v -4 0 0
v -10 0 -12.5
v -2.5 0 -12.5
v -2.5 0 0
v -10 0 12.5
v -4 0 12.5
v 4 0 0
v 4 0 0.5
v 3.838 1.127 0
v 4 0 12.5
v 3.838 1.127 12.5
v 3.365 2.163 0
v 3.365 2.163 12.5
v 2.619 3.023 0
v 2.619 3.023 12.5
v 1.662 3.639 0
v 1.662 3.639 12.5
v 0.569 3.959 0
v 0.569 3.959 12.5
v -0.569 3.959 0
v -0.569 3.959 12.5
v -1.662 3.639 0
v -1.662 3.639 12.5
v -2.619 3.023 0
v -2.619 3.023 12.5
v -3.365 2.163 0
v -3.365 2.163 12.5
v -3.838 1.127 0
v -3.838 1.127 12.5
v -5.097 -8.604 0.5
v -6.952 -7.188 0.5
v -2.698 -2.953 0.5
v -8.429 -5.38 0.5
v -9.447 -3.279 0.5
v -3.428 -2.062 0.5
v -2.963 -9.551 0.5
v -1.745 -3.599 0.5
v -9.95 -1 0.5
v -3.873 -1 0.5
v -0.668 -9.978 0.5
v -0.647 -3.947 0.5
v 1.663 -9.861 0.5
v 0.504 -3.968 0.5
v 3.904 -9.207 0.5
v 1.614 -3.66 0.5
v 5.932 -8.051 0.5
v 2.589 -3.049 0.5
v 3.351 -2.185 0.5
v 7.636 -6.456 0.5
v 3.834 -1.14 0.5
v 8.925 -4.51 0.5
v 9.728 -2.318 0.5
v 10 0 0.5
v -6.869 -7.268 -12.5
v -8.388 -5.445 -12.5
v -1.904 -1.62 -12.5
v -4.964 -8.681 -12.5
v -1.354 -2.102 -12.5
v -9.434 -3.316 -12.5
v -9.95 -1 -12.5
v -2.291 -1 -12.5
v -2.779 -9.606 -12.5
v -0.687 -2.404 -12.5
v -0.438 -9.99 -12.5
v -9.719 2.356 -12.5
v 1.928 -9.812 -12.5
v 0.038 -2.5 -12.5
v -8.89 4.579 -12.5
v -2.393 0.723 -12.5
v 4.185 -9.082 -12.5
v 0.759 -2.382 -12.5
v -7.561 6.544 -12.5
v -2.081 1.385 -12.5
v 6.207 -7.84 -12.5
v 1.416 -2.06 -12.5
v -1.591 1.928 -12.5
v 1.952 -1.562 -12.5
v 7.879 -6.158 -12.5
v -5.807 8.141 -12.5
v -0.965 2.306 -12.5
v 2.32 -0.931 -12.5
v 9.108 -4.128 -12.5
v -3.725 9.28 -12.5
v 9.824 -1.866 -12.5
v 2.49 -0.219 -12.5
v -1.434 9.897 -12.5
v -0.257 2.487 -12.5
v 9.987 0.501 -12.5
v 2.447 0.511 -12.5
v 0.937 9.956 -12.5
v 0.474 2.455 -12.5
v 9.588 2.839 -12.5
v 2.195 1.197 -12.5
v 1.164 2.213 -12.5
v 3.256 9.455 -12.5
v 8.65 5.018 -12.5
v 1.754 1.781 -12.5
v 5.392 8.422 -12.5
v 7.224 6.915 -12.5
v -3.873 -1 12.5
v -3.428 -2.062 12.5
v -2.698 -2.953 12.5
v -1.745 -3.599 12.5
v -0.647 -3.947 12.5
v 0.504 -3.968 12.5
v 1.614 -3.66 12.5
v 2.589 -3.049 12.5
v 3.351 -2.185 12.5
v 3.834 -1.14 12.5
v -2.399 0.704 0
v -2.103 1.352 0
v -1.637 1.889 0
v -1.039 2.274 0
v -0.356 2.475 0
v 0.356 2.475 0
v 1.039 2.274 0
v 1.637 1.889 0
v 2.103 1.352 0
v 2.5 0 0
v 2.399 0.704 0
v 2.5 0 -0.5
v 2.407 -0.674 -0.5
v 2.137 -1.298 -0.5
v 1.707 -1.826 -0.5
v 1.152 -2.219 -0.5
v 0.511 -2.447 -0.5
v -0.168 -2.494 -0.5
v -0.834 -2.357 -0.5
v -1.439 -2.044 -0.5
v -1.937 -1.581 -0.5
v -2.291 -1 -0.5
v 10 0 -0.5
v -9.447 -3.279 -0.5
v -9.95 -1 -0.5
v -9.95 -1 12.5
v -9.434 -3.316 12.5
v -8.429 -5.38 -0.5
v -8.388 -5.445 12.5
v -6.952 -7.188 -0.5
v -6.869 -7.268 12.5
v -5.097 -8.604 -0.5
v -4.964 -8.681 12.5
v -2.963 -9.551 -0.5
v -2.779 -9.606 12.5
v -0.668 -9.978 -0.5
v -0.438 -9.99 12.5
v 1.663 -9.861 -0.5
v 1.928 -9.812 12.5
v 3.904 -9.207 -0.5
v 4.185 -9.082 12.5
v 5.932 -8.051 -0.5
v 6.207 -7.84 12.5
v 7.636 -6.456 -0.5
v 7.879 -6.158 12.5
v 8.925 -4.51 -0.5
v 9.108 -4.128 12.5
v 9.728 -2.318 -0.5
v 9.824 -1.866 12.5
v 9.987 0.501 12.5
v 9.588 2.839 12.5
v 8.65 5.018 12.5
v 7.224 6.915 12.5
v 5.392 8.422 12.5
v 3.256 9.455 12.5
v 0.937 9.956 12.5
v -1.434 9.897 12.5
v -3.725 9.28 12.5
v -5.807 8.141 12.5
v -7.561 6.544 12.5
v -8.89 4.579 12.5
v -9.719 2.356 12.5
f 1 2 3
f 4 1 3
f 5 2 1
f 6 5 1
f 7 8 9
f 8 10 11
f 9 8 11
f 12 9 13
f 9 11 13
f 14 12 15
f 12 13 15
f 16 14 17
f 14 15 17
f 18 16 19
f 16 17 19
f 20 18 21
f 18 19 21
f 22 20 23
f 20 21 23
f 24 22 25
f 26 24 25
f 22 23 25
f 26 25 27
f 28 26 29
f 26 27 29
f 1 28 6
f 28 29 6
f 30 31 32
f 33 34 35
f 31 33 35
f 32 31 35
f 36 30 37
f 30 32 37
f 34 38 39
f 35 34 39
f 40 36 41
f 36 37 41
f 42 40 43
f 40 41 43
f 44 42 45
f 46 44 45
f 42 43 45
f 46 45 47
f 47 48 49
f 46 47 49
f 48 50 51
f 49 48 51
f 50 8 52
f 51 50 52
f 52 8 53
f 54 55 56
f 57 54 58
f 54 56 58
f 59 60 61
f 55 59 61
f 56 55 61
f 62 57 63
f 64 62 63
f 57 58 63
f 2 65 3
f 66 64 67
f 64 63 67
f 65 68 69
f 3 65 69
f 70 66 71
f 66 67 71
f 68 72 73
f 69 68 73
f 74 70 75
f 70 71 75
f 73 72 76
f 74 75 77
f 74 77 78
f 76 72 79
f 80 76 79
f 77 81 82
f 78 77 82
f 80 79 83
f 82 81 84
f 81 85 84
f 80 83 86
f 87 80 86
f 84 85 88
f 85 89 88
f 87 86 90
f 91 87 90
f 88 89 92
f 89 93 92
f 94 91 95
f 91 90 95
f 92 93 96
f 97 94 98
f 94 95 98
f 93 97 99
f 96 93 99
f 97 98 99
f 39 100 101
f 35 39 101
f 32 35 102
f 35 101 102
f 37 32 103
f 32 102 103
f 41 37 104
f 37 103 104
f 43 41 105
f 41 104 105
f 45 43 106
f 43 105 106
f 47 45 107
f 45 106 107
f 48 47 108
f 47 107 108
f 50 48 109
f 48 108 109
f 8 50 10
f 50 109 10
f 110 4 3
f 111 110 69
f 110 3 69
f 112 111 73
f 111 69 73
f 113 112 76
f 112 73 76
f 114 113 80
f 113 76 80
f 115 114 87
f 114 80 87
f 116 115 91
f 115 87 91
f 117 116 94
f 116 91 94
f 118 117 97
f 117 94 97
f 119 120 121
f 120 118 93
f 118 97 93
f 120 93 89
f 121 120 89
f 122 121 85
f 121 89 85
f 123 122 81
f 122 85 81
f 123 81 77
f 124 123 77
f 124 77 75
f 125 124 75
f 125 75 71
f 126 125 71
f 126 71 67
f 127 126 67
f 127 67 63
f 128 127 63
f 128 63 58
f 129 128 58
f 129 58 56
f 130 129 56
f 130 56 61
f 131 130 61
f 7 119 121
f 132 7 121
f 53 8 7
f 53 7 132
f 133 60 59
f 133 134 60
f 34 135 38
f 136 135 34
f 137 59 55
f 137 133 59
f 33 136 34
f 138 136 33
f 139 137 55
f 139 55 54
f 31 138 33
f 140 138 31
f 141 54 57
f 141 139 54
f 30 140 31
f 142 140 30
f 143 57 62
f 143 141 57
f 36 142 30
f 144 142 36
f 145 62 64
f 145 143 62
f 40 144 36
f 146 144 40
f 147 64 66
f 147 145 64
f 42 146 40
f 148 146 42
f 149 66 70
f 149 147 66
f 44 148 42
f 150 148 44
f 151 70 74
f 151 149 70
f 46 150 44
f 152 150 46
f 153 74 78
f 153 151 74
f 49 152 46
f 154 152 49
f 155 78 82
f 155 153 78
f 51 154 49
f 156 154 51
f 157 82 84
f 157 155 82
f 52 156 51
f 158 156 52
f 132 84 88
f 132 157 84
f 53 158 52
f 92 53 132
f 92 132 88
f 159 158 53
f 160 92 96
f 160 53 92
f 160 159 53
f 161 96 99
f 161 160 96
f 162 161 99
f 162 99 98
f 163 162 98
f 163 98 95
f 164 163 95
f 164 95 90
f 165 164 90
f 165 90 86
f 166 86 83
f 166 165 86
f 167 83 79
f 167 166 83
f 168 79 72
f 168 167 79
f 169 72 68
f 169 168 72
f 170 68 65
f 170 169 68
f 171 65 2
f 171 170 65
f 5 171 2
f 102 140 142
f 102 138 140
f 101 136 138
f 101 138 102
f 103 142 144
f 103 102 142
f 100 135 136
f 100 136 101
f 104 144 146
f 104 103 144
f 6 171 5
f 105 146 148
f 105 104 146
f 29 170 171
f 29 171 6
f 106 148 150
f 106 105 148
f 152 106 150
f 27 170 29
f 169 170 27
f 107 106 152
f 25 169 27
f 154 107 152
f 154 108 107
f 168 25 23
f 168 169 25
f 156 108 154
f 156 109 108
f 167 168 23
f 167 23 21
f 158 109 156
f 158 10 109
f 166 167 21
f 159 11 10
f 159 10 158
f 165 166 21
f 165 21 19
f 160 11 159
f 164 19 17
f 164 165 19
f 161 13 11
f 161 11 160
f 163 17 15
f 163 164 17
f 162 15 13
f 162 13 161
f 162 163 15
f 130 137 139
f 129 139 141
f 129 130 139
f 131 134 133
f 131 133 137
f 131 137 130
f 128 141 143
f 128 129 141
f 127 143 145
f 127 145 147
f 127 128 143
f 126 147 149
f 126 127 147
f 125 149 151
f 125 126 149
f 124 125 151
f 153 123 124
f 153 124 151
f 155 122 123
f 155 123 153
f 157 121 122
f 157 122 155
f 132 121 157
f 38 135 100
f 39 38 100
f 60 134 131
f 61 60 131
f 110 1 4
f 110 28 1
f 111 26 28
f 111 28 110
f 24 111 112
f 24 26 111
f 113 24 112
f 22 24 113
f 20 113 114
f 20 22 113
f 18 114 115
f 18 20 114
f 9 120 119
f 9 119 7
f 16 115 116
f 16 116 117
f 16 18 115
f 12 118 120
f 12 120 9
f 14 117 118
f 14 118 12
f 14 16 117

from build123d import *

# Parameters (mm, degrees)
SKETCH_1_R          = 10
EXTRUDE_1_DEPTH     = 12.5
SKETCH_2_R          = 4
CUT_EXTRUDE_1_DEPTH = 12.5
SKETCH_4_W          = 53.049184892
SKETCH_4_H          = 1
CUT_EXTRUDE_2_DEPTH = 25
SKETCH_5_W          = 15.903552991
SKETCH_5_H          = 1
CUT_EXTRUDE_3_DEPTH = 25
SKETCH_6_R          = 2.5
CUT_EXTRUDE_4_DEPTH = 25


with BuildPart() as part:
    # 草图1 → 凸台-拉伸1 (new body, symmetric)
    with BuildSketch(Plane.XY):
        Circle(SKETCH_1_R)
    extrude(amount=EXTRUDE_1_DEPTH, both=True)

    # 草图2 → 切除-拉伸1 (cut)
    with BuildSketch(Plane.XY.offset(12.5)):
        Circle(SKETCH_2_R)
    extrude(amount=-CUT_EXTRUDE_1_DEPTH, mode=Mode.SUBTRACT)

    # 草图4 → 切除-拉伸2 (cut)
    with BuildSketch(Plane(origin=(0, 0, 0), x_dir=(1, 0, 0), z_dir=(0, 1, 0))):
        Rectangle(SKETCH_4_W, SKETCH_4_H)
    extrude(amount=-CUT_EXTRUDE_2_DEPTH, mode=Mode.SUBTRACT)

    # 草图5 → 切除-拉伸3 (cut)
    with BuildSketch(Plane.XY.offset(12.5)):
        with Locations((-7.951776496, -0.5)):
            Rectangle(SKETCH_5_W, SKETCH_5_H)
    extrude(amount=-CUT_EXTRUDE_3_DEPTH, mode=Mode.SUBTRACT)

    # 草图6 → 切除-拉伸4 (cut)
    with BuildSketch(Plane(origin=(0, 0, -12.5), x_dir=(-1, 0, 0), z_dir=(0, 0, -1))):
        Circle(SKETCH_6_R)
    extrude(amount=-CUT_EXTRUDE_4_DEPTH, mode=Mode.SUBTRACT)


solid = part.part
